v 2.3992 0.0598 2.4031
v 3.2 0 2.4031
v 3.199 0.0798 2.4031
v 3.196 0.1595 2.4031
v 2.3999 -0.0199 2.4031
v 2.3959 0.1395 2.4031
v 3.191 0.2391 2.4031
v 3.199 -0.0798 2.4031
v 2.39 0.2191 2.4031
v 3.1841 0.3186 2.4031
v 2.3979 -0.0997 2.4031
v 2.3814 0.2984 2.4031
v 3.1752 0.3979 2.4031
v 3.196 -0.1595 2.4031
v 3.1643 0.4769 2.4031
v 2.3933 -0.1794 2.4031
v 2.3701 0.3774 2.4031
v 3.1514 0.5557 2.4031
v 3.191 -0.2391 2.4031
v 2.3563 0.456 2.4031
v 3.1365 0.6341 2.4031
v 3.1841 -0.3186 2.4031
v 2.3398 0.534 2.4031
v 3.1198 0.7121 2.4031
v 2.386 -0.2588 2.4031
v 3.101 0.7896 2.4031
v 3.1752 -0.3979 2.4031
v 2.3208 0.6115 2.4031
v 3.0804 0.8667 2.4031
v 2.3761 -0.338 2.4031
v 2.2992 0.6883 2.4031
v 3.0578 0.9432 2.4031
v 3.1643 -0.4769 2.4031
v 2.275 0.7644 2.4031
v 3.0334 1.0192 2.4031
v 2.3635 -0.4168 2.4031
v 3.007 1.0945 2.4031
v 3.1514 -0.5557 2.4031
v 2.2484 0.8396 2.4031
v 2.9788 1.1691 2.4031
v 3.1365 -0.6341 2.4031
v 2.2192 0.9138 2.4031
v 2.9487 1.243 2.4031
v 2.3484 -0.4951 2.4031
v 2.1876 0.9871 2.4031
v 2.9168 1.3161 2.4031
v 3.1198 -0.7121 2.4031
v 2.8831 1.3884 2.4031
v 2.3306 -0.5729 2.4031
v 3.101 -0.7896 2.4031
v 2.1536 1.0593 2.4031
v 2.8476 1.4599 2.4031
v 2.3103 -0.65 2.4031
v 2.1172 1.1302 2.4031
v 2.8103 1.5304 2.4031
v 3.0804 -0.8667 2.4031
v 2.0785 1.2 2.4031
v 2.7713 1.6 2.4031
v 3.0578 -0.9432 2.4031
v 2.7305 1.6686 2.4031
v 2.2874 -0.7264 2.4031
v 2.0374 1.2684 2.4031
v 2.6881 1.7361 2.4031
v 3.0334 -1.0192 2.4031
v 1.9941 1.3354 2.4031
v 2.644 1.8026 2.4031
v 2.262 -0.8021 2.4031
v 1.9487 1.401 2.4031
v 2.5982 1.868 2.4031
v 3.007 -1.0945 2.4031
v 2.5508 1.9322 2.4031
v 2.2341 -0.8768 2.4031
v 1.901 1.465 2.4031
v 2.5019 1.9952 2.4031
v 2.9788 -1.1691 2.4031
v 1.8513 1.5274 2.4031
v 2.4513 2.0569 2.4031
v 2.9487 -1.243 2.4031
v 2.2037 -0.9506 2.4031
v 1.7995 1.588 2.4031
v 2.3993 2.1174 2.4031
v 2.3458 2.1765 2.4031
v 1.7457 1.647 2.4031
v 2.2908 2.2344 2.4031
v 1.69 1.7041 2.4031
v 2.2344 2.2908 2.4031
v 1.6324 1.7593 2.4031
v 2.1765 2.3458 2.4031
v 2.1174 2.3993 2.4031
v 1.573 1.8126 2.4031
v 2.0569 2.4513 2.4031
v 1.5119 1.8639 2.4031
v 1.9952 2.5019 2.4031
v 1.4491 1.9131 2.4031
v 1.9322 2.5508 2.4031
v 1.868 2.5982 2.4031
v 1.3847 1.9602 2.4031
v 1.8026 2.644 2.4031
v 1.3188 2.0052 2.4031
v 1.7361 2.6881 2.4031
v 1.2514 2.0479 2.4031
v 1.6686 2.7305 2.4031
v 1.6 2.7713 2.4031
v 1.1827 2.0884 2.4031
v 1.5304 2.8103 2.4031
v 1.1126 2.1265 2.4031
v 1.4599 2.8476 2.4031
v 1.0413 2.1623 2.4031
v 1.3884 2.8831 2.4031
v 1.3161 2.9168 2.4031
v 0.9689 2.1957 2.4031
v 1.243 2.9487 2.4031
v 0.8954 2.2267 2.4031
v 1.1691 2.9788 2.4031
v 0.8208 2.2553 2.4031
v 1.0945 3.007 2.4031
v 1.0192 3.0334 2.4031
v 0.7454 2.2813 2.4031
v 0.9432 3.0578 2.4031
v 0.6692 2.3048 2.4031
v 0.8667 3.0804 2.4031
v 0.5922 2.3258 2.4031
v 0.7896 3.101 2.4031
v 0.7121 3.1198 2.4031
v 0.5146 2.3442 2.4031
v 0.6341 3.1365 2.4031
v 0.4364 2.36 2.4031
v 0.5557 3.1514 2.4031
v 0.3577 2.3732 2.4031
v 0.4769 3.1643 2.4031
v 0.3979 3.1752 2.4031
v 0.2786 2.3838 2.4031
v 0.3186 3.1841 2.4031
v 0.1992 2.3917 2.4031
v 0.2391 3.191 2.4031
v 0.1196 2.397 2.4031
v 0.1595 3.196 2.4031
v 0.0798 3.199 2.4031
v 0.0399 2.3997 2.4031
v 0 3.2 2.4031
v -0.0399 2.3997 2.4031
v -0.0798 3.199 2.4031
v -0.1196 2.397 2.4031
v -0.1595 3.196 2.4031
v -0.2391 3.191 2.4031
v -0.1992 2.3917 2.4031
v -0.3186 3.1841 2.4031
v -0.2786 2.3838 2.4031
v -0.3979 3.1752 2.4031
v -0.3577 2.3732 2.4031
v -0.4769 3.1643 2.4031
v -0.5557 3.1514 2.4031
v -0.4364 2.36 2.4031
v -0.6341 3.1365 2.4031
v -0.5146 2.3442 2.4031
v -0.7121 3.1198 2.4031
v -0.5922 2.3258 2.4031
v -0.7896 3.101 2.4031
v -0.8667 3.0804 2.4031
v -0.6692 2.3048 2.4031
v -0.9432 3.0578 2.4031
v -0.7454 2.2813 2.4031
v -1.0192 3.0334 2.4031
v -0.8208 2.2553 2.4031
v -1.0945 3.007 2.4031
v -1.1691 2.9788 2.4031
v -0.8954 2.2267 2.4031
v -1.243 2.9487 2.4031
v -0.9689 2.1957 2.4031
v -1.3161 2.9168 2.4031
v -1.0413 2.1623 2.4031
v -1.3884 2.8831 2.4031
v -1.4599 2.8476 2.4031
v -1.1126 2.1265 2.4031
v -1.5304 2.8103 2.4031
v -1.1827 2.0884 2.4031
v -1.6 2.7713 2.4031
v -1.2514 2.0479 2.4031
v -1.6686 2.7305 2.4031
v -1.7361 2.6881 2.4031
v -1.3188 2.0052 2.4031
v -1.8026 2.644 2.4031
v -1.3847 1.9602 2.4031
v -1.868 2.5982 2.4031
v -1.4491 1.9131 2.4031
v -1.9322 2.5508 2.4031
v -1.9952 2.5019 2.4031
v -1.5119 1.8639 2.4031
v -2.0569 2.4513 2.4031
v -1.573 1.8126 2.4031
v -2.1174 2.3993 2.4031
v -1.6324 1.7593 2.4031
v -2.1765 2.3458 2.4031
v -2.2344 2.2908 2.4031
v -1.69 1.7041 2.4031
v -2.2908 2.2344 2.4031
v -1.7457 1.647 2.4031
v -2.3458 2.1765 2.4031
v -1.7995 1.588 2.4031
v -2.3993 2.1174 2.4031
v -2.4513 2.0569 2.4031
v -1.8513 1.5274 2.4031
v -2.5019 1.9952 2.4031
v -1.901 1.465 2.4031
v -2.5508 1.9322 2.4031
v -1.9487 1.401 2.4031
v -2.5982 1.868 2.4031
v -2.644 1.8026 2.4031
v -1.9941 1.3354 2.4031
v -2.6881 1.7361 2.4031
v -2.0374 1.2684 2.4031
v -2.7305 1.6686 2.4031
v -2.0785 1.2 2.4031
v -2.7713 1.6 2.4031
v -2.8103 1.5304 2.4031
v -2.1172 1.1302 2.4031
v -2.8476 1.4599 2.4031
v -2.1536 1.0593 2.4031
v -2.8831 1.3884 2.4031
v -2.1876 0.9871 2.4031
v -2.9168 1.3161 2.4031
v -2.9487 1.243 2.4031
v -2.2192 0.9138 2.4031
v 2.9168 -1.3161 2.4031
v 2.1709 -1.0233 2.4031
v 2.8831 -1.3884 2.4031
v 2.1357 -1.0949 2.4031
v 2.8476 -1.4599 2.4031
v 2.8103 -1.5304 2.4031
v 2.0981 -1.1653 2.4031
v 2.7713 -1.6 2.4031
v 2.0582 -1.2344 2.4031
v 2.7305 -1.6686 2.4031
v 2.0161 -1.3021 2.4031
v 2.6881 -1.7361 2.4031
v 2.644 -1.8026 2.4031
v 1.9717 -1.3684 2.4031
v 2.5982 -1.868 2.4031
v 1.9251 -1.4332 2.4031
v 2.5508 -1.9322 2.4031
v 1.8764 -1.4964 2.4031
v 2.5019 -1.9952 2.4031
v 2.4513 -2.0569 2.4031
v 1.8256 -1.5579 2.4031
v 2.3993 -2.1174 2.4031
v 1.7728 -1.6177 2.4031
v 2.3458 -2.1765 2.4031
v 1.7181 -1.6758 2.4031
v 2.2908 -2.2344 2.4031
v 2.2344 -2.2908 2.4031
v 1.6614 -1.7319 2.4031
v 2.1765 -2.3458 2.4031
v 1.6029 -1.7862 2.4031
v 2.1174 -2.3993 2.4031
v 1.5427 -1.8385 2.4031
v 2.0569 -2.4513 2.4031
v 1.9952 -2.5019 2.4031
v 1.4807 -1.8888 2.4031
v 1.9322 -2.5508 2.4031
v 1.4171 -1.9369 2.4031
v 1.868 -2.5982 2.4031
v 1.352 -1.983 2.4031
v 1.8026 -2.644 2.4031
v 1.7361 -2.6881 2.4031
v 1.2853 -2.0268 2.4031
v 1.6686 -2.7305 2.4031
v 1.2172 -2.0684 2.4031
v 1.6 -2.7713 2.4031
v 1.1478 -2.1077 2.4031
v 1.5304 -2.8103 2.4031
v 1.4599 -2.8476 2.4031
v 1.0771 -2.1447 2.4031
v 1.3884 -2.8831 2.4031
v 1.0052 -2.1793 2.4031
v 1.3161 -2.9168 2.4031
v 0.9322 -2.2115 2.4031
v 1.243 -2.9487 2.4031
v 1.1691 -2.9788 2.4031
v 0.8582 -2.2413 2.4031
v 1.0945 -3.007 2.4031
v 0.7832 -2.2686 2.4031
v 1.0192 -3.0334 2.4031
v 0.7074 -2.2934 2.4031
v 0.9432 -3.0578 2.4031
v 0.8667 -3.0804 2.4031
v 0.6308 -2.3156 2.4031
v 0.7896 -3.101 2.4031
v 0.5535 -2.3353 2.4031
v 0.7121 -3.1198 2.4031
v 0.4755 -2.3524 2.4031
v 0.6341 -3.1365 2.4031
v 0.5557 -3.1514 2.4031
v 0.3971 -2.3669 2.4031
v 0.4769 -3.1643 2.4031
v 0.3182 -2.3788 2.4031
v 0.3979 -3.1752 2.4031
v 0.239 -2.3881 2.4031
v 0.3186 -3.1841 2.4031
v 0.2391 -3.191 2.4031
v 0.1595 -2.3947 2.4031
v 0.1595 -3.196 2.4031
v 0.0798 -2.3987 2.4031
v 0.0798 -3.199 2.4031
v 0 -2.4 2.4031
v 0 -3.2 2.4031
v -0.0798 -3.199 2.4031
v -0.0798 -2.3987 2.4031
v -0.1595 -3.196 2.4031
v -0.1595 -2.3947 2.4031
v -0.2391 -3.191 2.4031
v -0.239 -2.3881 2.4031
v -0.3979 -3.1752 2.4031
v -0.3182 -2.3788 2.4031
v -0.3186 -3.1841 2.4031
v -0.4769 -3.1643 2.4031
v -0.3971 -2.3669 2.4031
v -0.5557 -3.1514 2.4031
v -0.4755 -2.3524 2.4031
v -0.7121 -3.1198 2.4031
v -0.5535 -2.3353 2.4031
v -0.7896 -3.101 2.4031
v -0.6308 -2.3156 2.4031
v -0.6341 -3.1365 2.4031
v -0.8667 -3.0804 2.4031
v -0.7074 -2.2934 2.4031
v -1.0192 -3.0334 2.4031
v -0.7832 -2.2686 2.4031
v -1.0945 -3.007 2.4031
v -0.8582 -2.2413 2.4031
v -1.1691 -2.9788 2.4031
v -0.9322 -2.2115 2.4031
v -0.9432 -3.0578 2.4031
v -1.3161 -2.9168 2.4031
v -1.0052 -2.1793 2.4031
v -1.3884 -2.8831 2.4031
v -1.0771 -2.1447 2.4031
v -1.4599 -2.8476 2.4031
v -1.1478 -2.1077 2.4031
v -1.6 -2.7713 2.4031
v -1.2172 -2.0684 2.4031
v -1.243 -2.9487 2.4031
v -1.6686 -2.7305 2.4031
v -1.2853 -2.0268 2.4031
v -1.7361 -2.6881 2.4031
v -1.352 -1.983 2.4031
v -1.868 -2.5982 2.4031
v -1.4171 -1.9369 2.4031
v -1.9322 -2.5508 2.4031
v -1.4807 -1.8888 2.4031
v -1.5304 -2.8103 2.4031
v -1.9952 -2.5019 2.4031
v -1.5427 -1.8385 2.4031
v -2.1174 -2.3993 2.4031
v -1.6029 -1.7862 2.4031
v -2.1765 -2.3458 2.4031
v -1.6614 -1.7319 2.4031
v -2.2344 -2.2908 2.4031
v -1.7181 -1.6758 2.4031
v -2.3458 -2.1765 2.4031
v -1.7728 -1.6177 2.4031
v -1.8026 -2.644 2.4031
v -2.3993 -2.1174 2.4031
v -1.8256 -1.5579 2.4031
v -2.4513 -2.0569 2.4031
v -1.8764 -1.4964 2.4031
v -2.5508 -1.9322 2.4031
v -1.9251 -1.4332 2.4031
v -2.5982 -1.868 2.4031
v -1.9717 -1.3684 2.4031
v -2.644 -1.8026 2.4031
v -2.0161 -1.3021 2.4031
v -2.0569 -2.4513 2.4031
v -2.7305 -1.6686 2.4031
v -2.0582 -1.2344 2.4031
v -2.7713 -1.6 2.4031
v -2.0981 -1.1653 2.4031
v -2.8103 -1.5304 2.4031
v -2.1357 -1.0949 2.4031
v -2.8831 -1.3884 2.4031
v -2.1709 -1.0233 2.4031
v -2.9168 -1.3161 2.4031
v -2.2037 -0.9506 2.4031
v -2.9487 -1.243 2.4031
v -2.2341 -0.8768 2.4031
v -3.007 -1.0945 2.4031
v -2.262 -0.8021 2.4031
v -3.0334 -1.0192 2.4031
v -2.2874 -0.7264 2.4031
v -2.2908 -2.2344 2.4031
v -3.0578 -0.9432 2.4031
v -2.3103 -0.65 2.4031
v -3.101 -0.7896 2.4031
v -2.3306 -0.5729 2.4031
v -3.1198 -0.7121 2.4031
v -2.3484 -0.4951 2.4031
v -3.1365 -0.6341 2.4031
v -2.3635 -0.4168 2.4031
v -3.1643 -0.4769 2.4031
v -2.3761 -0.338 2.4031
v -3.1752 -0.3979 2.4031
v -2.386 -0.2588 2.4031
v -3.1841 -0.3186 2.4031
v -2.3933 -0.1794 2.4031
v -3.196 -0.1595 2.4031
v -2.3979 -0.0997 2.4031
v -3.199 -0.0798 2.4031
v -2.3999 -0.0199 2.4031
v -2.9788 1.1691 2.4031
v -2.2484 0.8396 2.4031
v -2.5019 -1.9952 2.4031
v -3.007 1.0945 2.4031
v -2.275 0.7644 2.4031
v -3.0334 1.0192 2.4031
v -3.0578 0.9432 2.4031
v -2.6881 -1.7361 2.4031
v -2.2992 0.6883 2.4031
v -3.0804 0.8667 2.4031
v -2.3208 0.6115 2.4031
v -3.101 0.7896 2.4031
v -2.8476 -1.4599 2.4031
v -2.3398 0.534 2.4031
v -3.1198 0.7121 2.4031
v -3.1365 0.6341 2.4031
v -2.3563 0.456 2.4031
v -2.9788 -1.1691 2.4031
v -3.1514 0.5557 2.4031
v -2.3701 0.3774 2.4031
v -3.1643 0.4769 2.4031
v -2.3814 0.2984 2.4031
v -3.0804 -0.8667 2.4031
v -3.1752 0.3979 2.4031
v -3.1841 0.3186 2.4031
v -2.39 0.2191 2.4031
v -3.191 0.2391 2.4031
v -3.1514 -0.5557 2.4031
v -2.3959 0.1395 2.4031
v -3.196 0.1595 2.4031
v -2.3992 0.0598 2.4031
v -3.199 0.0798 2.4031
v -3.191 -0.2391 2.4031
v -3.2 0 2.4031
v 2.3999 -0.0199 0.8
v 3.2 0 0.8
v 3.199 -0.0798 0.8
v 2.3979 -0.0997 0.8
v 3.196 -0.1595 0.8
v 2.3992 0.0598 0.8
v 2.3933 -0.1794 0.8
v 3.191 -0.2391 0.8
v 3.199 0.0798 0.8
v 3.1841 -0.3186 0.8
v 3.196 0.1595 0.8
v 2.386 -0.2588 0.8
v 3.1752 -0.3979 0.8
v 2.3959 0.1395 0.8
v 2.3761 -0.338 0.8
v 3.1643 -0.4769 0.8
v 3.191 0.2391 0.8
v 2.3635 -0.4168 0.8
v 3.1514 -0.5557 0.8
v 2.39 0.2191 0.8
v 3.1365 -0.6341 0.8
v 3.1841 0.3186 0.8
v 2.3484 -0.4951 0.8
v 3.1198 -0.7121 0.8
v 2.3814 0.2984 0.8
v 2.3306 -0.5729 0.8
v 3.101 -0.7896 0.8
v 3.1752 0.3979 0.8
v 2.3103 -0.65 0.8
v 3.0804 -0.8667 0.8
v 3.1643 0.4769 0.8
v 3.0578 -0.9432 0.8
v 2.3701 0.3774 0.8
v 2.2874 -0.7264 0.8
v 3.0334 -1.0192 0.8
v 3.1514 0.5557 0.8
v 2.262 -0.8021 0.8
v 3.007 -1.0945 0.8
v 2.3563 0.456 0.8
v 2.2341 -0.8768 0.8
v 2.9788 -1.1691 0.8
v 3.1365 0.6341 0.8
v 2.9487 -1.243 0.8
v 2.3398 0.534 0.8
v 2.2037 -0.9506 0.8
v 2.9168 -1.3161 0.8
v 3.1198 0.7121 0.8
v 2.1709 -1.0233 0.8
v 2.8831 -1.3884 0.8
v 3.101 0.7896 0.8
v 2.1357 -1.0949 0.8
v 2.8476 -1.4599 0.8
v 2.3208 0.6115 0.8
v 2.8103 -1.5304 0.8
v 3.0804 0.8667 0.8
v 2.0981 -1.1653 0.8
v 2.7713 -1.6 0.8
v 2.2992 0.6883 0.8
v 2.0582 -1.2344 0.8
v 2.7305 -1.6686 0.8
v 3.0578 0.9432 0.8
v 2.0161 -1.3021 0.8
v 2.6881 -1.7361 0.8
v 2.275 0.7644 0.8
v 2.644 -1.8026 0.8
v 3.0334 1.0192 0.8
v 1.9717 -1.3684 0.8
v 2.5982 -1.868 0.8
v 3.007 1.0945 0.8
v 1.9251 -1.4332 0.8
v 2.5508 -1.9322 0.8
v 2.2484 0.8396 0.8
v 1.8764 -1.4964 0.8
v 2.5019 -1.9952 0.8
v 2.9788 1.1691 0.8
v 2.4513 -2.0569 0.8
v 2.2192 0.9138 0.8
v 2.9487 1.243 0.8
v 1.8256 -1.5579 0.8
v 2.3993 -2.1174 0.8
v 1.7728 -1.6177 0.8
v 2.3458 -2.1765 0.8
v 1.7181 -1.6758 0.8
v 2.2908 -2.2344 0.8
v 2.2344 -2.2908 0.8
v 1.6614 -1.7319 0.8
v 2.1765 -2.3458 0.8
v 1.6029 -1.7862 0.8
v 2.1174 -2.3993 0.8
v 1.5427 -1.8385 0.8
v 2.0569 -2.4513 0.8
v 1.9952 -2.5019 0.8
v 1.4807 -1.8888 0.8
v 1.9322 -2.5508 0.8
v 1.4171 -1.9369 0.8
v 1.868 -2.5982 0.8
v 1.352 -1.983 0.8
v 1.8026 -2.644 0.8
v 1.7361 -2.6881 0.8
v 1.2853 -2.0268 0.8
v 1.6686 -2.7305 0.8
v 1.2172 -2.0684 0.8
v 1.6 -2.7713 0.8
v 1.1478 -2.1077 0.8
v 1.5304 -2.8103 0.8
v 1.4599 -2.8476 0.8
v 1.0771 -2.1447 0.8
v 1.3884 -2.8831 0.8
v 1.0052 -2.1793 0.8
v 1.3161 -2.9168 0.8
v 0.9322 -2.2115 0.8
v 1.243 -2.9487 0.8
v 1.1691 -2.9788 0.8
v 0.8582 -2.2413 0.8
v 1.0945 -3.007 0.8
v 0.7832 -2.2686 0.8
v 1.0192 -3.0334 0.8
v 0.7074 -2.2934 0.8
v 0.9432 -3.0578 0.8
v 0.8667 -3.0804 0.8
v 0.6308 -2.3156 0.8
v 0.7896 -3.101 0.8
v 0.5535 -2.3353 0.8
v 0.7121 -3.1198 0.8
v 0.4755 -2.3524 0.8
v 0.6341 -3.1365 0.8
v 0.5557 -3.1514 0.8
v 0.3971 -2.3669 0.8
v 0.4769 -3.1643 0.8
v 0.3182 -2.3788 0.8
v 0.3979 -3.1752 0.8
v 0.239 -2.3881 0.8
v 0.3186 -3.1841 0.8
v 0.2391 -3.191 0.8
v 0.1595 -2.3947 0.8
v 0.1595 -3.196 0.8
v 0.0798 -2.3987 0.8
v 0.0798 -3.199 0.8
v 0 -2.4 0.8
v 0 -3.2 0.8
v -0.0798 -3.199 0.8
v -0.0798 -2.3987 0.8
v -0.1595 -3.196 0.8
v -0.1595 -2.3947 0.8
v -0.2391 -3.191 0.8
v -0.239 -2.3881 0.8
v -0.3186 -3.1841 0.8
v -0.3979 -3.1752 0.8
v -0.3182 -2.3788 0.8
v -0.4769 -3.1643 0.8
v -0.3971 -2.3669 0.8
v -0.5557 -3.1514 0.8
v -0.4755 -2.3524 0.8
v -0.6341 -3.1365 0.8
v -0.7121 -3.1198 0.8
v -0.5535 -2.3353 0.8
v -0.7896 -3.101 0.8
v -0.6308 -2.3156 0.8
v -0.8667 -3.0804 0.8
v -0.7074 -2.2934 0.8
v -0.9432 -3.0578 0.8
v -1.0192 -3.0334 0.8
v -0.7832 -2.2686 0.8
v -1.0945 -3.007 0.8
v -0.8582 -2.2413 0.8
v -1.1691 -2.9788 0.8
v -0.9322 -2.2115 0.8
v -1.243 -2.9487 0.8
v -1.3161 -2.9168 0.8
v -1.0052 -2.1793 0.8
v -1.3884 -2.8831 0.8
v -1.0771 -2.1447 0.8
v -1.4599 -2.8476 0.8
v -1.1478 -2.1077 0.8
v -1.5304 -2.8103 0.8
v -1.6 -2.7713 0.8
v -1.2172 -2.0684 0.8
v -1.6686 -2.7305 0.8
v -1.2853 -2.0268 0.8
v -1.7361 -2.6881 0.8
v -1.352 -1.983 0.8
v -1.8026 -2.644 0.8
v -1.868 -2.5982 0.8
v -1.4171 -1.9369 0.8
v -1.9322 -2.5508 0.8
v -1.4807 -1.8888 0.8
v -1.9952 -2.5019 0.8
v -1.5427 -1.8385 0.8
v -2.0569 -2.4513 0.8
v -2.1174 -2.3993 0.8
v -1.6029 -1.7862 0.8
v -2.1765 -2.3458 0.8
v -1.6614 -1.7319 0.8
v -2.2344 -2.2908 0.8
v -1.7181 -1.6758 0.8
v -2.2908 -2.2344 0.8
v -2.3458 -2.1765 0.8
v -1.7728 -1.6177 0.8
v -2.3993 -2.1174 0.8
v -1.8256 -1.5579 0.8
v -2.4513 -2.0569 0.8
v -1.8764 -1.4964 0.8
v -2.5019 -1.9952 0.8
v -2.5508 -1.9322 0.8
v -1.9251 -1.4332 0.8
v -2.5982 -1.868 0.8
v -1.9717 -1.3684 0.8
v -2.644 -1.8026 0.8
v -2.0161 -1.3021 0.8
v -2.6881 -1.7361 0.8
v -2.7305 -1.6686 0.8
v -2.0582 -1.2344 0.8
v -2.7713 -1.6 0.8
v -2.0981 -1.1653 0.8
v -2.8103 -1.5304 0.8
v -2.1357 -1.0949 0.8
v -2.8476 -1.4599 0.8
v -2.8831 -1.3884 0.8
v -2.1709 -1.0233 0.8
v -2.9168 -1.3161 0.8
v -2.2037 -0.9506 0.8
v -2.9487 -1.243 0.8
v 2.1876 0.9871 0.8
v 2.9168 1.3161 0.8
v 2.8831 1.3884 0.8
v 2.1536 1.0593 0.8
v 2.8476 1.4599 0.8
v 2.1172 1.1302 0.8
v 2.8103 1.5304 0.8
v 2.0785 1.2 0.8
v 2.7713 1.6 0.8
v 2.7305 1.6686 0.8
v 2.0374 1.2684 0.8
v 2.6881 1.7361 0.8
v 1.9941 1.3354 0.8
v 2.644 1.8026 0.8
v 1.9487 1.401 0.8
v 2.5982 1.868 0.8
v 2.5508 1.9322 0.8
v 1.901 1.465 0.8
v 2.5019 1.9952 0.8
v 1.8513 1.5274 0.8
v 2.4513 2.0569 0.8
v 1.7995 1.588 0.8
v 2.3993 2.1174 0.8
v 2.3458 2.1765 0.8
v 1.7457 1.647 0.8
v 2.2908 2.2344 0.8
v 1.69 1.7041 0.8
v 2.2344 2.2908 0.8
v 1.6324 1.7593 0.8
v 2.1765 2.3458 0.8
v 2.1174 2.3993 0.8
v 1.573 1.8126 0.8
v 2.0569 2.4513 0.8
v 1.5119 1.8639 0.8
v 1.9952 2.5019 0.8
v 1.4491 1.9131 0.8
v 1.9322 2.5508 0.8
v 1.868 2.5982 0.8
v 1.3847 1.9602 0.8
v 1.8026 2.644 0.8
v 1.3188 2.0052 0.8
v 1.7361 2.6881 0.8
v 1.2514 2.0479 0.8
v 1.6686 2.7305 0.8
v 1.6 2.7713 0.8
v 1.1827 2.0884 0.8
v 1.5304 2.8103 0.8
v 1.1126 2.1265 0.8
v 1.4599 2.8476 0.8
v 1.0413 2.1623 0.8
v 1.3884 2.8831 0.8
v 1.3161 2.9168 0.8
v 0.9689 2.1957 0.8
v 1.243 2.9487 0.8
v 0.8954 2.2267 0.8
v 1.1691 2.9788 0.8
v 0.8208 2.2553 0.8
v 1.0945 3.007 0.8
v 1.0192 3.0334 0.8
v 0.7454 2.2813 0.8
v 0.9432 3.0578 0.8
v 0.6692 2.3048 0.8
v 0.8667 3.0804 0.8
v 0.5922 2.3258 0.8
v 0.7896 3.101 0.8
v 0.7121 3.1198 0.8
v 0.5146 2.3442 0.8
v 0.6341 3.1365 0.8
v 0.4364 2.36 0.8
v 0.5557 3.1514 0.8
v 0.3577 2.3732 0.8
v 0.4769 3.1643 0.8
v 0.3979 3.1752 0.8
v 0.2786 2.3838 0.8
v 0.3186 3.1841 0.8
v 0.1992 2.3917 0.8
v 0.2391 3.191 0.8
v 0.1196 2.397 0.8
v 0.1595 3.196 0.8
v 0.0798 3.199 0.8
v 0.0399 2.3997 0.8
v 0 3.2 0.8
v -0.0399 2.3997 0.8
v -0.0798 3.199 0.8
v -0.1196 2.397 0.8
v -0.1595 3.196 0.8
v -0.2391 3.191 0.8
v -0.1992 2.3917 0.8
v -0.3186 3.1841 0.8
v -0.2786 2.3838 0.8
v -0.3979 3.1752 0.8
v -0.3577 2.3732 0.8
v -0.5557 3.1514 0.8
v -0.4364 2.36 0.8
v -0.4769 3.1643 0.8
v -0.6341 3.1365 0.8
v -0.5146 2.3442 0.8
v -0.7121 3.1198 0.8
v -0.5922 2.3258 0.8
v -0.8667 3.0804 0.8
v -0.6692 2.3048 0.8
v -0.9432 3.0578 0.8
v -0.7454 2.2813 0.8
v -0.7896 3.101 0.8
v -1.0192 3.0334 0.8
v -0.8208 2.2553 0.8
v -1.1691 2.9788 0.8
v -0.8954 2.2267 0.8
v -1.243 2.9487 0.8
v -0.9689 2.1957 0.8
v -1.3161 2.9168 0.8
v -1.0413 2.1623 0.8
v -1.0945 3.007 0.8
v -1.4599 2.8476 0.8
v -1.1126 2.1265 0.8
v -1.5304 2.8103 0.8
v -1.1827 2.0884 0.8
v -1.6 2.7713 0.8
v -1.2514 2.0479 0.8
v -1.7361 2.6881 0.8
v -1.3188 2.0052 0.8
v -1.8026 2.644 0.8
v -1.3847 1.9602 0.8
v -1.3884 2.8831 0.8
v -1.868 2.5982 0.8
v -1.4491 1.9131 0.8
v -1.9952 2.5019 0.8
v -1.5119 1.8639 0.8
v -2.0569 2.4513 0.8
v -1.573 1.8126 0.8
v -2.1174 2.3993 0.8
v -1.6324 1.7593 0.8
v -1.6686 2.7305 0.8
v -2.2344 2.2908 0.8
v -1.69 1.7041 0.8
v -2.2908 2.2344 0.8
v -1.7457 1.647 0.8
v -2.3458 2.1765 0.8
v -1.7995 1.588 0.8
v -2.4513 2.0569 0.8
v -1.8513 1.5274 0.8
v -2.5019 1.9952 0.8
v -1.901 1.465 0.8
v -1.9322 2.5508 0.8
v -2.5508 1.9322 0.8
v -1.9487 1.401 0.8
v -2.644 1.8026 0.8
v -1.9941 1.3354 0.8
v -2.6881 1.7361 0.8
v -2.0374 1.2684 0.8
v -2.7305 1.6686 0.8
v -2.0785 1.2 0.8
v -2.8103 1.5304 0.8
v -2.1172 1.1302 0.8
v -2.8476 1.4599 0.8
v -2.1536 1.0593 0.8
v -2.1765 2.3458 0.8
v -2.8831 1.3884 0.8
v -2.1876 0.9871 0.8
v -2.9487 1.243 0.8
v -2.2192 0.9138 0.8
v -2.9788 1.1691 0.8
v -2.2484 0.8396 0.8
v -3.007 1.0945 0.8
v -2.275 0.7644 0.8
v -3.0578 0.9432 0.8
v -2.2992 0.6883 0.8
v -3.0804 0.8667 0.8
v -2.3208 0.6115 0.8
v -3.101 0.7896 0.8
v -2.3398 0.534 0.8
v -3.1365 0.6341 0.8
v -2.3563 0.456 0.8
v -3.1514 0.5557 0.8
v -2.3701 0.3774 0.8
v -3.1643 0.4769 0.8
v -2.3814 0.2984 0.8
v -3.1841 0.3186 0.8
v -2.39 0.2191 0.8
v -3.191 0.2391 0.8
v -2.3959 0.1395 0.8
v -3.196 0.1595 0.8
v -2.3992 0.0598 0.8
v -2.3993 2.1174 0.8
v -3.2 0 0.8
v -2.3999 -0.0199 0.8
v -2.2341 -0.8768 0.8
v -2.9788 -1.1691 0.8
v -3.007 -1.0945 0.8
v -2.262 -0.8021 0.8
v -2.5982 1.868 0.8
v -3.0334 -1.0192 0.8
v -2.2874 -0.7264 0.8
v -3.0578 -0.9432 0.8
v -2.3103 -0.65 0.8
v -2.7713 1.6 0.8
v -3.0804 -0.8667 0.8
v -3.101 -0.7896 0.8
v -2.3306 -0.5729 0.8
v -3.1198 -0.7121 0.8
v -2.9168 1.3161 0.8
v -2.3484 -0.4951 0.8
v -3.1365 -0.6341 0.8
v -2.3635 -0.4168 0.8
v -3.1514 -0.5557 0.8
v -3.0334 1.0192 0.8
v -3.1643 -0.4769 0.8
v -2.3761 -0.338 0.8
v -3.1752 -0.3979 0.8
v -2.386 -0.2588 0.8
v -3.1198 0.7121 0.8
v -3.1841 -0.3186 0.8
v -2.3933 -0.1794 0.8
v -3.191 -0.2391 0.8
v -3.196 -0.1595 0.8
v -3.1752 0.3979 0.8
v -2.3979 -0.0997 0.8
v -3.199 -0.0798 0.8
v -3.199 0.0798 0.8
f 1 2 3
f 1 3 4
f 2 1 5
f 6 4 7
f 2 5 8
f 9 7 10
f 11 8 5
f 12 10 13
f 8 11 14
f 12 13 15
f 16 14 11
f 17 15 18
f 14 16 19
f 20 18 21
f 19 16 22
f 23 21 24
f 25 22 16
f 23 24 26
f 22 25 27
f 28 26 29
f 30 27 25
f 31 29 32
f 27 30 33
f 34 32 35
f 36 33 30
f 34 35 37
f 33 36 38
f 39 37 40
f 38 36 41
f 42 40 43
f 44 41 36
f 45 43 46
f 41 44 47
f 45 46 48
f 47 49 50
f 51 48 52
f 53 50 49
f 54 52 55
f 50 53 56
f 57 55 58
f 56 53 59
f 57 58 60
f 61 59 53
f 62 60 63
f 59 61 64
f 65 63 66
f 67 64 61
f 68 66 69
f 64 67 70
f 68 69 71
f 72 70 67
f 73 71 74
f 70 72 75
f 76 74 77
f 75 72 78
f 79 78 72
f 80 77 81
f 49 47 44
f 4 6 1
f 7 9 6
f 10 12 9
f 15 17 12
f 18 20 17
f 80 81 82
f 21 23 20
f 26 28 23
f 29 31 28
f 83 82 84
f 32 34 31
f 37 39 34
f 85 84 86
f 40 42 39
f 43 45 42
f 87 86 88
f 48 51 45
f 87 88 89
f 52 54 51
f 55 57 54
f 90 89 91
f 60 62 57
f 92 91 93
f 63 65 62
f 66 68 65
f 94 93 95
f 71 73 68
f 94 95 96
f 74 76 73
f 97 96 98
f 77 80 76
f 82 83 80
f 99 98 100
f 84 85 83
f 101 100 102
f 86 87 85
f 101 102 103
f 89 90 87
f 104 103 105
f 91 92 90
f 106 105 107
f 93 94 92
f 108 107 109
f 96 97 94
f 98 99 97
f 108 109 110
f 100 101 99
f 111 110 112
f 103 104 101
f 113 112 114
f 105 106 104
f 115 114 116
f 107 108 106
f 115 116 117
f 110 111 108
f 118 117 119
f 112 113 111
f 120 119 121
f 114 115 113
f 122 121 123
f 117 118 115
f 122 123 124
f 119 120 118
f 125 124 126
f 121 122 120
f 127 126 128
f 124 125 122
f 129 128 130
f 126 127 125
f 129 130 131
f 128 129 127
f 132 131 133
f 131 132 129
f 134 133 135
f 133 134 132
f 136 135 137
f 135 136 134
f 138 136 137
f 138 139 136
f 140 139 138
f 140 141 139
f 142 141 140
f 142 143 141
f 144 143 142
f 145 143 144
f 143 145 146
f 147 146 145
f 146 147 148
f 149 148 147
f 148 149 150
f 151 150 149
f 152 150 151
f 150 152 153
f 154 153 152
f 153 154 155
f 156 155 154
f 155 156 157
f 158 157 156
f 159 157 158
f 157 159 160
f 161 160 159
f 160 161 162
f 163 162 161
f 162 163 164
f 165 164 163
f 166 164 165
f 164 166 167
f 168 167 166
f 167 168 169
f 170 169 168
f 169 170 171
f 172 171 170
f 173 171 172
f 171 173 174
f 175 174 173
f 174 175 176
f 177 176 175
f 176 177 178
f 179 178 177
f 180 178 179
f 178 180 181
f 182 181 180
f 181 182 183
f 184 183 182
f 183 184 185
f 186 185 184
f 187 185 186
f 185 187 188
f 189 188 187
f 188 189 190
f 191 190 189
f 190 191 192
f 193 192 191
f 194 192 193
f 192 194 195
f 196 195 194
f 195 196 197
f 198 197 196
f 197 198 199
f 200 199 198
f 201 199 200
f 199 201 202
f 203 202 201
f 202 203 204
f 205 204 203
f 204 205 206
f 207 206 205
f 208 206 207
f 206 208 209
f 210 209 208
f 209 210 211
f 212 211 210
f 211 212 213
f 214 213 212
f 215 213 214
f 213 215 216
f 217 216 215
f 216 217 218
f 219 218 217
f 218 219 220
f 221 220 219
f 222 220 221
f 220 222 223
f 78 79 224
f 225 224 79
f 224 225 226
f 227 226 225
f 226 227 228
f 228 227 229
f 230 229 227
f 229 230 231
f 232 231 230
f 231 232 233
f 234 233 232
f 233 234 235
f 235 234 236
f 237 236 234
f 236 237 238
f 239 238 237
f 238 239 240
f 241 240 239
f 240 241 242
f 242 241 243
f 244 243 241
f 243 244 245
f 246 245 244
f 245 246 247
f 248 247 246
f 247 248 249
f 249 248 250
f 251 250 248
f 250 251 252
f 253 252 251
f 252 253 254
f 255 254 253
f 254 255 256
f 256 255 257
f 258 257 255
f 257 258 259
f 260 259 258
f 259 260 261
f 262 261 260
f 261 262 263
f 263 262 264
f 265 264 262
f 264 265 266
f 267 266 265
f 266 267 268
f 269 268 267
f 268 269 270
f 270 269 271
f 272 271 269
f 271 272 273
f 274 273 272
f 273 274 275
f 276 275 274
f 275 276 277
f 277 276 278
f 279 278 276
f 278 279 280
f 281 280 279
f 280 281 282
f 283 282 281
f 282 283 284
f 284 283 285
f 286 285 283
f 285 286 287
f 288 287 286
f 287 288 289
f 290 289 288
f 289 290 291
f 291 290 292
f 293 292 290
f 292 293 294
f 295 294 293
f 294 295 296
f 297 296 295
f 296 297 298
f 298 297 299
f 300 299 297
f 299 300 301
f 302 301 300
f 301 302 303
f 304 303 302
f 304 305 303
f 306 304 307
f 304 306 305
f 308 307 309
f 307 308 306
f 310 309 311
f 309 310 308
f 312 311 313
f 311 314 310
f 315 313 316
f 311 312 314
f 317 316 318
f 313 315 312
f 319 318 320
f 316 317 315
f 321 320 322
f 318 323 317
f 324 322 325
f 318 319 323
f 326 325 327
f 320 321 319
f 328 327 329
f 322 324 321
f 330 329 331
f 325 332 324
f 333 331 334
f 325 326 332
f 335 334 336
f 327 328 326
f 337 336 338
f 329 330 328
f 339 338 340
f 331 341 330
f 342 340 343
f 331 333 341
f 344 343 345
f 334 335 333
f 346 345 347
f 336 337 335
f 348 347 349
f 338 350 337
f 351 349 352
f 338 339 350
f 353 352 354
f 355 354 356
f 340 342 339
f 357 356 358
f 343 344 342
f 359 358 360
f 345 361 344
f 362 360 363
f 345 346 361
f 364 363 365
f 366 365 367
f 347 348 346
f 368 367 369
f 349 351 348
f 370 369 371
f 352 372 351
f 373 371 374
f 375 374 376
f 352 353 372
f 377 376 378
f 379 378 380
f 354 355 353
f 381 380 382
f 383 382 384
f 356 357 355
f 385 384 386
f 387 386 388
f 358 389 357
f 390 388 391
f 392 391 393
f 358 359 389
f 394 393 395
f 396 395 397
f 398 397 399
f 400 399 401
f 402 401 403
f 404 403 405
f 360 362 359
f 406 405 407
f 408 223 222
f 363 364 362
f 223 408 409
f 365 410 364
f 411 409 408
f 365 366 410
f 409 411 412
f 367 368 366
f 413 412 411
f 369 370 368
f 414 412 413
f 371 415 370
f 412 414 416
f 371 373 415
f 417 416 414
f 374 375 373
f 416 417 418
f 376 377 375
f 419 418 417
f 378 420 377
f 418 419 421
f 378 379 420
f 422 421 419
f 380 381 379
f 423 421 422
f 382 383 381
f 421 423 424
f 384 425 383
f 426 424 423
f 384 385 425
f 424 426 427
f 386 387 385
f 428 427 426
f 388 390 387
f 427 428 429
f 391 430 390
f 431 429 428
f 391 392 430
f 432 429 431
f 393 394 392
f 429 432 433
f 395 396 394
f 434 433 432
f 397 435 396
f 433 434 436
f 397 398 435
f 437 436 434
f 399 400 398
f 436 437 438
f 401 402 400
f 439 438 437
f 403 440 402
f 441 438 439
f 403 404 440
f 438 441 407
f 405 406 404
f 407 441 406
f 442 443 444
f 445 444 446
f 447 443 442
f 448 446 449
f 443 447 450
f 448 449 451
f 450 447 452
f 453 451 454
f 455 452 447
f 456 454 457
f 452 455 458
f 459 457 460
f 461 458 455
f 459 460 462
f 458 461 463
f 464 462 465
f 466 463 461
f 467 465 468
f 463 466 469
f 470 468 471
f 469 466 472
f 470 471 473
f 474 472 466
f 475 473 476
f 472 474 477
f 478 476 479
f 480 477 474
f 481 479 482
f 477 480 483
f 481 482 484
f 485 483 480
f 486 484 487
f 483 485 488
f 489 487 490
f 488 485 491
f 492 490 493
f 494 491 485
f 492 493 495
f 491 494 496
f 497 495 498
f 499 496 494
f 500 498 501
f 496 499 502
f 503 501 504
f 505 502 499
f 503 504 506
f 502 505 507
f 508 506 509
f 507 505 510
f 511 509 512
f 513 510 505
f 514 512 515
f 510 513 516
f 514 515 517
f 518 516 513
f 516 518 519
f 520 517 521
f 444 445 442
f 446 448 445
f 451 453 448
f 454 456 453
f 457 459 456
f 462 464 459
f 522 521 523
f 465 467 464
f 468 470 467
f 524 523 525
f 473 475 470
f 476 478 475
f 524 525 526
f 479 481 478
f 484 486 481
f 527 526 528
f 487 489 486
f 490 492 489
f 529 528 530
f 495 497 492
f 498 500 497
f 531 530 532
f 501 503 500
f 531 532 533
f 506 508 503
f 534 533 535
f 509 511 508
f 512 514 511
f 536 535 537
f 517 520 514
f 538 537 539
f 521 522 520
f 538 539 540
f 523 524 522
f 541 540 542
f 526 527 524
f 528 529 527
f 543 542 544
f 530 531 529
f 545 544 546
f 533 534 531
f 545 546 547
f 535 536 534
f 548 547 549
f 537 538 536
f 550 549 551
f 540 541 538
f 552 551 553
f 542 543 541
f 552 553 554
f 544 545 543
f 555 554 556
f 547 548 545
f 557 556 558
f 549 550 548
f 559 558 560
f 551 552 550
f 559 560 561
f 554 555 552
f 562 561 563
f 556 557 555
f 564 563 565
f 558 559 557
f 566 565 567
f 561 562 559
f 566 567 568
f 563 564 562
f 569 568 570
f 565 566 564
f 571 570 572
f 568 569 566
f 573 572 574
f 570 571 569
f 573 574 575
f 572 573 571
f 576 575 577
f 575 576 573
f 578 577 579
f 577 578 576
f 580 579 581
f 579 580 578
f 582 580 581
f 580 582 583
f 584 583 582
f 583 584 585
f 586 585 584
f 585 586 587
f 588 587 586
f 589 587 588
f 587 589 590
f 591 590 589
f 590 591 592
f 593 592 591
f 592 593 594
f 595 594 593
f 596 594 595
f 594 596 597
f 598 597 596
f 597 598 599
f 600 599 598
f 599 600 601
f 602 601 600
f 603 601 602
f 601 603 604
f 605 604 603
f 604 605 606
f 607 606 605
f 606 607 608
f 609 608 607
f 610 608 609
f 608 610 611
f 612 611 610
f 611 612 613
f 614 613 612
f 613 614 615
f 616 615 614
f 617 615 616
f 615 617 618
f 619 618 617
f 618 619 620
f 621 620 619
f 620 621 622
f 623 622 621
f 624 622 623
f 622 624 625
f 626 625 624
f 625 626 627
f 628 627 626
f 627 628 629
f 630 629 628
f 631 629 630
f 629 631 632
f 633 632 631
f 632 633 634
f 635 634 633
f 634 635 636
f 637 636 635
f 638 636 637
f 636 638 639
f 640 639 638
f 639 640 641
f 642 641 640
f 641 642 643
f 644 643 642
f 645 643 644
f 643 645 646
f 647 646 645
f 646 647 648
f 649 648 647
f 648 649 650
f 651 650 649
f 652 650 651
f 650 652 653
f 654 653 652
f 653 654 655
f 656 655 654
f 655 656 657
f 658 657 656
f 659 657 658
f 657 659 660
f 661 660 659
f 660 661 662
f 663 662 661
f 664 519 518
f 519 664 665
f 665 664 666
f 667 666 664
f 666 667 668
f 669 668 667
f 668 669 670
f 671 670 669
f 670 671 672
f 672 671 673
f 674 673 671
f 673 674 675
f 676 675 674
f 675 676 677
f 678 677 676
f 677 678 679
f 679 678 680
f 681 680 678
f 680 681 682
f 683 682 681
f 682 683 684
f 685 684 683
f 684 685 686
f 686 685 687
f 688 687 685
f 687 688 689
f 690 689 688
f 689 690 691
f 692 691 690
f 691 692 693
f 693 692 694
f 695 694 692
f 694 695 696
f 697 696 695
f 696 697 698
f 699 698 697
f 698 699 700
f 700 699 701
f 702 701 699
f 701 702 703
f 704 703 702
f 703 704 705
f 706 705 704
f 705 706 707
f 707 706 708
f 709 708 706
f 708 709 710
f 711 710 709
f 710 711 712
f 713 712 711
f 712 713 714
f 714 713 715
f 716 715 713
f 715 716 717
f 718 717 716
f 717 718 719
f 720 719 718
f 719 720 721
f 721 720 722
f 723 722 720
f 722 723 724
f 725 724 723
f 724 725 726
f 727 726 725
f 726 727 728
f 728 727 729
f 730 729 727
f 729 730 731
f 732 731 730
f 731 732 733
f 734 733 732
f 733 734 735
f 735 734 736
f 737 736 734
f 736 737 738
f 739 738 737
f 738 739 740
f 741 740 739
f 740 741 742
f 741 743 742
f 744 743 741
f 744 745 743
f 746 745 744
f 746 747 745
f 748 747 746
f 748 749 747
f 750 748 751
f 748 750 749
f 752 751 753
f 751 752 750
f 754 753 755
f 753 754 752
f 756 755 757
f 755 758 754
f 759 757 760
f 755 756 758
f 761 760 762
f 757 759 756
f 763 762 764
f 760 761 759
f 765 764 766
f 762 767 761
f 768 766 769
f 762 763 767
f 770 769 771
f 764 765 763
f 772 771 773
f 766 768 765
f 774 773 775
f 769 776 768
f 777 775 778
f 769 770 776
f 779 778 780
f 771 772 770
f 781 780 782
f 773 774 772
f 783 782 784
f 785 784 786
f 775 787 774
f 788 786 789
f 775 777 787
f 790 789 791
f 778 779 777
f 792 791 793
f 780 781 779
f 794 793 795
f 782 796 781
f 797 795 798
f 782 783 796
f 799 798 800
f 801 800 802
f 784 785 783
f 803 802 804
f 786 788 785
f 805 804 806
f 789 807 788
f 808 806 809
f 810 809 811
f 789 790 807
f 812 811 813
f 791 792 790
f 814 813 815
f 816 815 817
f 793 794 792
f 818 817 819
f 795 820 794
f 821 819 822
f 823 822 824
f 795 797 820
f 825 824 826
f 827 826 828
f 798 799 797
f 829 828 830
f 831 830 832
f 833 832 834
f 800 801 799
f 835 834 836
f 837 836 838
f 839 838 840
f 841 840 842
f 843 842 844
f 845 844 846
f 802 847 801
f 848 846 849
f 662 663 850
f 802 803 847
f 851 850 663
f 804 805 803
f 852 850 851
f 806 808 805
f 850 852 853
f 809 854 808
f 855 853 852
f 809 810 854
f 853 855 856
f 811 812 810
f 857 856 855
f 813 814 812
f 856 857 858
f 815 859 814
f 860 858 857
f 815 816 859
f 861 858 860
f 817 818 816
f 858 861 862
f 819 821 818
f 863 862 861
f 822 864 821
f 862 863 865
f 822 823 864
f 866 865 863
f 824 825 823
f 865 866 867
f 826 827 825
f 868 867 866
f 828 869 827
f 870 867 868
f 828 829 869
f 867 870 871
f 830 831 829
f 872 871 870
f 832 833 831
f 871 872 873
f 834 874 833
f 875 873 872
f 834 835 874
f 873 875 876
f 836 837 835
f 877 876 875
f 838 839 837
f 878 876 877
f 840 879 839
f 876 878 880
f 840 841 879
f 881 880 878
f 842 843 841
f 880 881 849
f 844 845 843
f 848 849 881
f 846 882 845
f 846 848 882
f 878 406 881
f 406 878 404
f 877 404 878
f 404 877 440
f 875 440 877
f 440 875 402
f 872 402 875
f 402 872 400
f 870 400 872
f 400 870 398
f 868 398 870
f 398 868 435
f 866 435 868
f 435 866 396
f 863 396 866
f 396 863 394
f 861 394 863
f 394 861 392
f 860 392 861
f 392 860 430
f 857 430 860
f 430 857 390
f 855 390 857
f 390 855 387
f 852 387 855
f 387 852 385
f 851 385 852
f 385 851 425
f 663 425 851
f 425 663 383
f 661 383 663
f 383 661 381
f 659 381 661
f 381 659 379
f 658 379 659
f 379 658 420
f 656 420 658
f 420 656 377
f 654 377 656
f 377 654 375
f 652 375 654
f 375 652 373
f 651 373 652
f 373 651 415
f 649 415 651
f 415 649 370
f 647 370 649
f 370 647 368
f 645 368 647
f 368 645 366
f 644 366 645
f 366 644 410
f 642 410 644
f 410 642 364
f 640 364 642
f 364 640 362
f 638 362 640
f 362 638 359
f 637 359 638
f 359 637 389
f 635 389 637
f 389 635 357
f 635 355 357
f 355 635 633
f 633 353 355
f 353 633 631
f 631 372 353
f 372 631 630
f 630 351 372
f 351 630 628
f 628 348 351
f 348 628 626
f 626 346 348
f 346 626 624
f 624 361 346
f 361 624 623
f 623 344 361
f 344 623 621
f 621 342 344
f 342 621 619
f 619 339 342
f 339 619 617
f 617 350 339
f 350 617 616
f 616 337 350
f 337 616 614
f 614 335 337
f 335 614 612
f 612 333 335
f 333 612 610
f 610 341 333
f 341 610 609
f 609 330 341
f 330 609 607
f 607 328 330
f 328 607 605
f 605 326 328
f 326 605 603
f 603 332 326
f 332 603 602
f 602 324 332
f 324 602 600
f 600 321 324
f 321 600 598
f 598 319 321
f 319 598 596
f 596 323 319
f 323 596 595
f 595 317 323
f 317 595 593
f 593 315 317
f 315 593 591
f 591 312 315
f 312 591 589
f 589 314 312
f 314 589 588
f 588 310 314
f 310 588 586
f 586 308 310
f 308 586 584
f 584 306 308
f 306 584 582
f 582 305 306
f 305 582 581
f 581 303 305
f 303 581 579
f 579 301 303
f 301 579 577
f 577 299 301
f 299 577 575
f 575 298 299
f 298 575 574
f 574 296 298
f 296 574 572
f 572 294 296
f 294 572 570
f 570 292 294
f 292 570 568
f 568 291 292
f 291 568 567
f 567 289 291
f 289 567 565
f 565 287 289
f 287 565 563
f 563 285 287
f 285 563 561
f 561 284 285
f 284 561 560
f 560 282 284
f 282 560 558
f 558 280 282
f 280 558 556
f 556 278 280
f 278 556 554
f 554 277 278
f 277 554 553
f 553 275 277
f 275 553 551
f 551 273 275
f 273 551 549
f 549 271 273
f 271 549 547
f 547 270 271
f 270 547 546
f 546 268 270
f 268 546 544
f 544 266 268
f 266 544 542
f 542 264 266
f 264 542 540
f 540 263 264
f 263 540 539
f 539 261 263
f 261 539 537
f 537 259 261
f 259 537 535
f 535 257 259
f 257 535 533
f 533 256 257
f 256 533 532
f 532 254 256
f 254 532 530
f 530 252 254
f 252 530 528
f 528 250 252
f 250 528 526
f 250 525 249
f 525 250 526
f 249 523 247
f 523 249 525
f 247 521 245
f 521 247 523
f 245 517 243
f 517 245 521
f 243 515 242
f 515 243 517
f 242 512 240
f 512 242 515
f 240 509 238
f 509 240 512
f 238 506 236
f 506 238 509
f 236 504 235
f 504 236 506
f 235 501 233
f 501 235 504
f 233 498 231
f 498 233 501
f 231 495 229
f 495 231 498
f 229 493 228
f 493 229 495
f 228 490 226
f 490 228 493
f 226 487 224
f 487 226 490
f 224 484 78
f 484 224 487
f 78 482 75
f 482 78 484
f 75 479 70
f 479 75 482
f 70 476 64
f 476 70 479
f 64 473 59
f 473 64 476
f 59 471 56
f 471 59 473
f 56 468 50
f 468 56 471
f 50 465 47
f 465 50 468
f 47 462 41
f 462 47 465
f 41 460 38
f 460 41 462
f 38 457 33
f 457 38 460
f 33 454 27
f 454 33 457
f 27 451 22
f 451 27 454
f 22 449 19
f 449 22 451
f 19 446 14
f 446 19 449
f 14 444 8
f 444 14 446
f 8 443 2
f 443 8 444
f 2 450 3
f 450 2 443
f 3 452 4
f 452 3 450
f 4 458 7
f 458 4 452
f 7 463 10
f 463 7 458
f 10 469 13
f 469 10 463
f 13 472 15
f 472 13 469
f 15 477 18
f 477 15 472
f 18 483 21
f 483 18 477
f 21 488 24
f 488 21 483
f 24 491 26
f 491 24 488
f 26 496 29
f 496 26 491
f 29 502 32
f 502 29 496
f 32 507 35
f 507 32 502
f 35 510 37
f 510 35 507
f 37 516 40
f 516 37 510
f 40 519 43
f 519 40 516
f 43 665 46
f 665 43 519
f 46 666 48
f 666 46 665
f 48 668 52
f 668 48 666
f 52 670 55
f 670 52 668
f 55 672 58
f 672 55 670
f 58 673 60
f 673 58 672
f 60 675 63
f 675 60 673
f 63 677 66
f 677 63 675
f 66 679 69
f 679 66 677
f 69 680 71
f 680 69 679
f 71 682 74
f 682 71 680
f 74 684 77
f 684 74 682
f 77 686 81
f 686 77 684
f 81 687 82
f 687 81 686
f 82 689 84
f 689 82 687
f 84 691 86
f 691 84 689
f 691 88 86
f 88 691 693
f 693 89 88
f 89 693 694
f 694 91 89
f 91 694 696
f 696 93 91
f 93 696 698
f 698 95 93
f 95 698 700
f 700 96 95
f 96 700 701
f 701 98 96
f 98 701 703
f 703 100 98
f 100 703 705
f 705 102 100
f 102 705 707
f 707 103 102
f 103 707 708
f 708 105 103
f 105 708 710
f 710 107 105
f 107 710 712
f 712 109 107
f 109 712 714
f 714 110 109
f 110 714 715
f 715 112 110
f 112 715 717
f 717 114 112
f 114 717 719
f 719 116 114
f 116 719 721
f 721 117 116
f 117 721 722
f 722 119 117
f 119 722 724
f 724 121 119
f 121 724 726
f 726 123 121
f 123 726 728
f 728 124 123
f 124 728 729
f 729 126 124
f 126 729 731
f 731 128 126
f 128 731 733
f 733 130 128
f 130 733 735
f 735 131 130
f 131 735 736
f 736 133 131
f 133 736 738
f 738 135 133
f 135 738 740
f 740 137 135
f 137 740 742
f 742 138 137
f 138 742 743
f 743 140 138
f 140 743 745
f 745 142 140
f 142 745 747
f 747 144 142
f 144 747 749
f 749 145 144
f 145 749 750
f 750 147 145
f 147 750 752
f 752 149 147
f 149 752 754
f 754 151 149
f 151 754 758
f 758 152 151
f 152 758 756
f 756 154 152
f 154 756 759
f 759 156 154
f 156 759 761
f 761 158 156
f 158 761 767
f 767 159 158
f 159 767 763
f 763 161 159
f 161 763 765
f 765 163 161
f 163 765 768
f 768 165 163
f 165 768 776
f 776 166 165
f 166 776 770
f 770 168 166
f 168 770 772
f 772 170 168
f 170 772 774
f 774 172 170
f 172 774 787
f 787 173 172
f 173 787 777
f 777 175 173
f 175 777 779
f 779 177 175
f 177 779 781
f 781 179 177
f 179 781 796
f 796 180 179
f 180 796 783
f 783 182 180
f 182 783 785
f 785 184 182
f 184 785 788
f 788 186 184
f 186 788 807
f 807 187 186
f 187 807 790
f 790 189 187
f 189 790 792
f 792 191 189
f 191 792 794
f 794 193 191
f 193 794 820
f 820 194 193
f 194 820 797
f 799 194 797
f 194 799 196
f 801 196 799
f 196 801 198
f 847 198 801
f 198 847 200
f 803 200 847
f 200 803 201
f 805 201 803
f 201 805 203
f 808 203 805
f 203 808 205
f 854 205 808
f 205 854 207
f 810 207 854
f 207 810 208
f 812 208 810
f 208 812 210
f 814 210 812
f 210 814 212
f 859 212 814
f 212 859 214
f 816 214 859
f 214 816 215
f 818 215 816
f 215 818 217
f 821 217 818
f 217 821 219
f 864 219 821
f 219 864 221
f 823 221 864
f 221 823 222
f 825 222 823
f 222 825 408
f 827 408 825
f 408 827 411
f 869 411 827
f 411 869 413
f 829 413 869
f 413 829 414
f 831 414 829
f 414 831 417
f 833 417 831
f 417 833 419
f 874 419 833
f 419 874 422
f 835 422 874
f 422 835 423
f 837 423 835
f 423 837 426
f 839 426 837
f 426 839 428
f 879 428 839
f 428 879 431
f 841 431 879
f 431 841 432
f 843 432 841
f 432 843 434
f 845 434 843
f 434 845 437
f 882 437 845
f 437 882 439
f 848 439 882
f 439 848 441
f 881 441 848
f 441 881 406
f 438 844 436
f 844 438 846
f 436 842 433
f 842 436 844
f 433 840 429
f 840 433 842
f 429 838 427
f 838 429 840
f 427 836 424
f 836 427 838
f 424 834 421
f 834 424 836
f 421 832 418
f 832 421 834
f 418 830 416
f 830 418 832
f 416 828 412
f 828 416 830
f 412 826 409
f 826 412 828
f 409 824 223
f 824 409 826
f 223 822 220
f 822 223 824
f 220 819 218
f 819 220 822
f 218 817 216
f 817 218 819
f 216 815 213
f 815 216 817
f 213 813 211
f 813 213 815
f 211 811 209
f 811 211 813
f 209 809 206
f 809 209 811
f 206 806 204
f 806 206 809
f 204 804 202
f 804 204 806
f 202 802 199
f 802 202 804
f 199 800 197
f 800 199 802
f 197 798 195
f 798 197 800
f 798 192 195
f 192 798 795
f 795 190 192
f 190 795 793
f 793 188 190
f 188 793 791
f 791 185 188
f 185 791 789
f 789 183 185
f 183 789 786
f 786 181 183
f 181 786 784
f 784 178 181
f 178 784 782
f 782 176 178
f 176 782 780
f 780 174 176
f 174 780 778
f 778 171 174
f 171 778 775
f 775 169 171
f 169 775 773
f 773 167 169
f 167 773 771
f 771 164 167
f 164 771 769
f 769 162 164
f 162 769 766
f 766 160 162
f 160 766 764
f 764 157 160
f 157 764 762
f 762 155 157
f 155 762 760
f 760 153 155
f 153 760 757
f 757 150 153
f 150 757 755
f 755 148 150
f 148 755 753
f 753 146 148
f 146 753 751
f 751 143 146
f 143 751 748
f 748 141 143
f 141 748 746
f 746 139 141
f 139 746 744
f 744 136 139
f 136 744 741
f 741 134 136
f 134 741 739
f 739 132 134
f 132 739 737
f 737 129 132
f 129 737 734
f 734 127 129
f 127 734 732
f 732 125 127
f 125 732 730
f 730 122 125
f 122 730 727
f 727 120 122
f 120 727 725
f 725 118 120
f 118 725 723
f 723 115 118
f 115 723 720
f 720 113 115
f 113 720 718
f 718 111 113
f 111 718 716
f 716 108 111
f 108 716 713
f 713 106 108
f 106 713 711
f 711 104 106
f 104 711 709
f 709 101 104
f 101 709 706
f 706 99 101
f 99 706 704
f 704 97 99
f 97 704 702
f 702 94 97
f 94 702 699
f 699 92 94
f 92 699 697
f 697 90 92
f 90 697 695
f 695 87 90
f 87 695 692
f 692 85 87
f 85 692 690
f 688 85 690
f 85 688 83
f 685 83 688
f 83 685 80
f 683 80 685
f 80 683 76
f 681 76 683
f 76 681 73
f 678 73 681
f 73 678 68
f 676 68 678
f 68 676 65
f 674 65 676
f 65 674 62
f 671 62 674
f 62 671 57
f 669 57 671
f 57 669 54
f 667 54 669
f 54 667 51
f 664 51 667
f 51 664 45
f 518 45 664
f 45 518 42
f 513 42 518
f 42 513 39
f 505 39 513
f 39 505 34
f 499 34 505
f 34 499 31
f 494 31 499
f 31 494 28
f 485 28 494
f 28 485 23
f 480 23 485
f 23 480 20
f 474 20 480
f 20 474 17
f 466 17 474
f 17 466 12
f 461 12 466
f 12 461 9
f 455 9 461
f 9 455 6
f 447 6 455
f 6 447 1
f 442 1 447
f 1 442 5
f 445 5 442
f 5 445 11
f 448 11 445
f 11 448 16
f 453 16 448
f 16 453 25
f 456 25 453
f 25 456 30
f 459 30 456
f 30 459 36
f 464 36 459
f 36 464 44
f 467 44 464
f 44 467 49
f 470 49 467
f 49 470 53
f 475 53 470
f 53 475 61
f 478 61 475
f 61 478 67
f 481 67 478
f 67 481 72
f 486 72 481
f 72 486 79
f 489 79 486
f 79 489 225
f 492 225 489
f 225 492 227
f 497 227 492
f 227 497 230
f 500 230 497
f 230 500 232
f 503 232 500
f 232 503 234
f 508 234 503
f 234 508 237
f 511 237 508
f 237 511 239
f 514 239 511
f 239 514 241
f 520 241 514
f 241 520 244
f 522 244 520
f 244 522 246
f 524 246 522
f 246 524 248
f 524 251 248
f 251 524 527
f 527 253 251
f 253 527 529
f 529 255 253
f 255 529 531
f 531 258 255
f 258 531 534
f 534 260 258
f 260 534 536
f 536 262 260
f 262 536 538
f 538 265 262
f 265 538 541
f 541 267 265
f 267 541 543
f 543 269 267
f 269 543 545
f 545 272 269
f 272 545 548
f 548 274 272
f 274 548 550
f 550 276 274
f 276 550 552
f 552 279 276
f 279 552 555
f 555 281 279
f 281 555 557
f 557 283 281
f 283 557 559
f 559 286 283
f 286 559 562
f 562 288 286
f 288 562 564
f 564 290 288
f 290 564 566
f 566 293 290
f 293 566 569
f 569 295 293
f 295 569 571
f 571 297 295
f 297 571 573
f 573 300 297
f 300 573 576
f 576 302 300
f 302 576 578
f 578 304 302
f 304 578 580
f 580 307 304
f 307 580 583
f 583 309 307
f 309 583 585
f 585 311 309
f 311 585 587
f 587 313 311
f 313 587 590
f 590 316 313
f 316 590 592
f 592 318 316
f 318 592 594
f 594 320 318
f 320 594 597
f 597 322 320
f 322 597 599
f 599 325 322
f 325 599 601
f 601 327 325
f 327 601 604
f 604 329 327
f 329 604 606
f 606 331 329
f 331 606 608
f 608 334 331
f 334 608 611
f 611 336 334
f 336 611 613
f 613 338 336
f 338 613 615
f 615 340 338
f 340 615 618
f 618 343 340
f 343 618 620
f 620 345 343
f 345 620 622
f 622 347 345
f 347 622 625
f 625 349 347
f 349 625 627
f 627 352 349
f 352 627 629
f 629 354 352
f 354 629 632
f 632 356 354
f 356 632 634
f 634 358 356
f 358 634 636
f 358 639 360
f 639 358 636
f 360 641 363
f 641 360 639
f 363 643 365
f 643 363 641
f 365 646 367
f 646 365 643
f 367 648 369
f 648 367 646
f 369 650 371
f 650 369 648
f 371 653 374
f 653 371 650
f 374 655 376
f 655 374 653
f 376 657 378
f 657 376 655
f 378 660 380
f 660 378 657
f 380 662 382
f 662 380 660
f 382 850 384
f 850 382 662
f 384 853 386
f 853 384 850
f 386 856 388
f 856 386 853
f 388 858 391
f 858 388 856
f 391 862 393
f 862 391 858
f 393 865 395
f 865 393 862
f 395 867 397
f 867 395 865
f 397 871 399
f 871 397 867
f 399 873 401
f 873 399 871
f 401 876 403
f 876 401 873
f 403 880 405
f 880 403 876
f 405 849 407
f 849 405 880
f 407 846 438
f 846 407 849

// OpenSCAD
use <../lib.scad>
use <s/u454p03s01.scad>
use <s/u454s01.scad>
$fa=1; $fs=0.2;
function ldraw_lib__u454p03(realsolid=false) = [
// 0 Signpost Slanted Cantilever with Suspended Sign with "POLICE" Pattern
// 0 Name: u454p03.dat
// 0 Author: Takeshi Takahashi [RainbowDolphin]
// 0 !LDRAW_ORG Part UPDATE 2022-02
// 0 !LICENSE Licensed under CC BY 2.0 and CC BY 4.0 : see CAreadme.txt
// 
// 0 BFC CERTIFY CCW
  [0,"BFC","CERTIFY"],
  [0,"BFC","CCW"],
// 
// 0 !CATEGORY Roadsign
// 0 !KEYWORDS Bricklink bb0107pb02, Set 370-1, Set 585-1
// 
// 0 !HISTORY 2022-03-06 [PTadmin] Official Update 2022-02
// 
// 
// 1 16 0 0 0 1 0 0 0 1 0 0 0 1 s\u454s01.dat
  [1,16,0,0,0,1,0,0,0,1,0,0,0,1, ldraw_lib__s__u454s01(realsolid)],
// 1 16 1 -145 -44 1 0 0 0 1 0 0 0 1 s\u454p03s01.dat
  [1,16,1,-145,-44,1,0,0,0,1,0,0,0,1, ldraw_lib__s__u454p03s01(realsolid)],
// 1 16 -1 -145 -44 -1 0 0 0 1 0 0 0 -1 s\u454p03s01.dat
  [1,16,-1,-145,-44,-1,0,0,0,1,0,0,0,-1, ldraw_lib__s__u454p03s01(realsolid)],
];
module ldraw_lib__u454p03(step=0, col=false, unit=2/5, alt=false, line=0.2, solid=!$preview)
    makepoly(ldraw_lib__u454p03(solid), step=step, col=col, unit=unit, alt=alt, line=line, solid=solid);
ldraw_lib__u454p03(line=0.2);
